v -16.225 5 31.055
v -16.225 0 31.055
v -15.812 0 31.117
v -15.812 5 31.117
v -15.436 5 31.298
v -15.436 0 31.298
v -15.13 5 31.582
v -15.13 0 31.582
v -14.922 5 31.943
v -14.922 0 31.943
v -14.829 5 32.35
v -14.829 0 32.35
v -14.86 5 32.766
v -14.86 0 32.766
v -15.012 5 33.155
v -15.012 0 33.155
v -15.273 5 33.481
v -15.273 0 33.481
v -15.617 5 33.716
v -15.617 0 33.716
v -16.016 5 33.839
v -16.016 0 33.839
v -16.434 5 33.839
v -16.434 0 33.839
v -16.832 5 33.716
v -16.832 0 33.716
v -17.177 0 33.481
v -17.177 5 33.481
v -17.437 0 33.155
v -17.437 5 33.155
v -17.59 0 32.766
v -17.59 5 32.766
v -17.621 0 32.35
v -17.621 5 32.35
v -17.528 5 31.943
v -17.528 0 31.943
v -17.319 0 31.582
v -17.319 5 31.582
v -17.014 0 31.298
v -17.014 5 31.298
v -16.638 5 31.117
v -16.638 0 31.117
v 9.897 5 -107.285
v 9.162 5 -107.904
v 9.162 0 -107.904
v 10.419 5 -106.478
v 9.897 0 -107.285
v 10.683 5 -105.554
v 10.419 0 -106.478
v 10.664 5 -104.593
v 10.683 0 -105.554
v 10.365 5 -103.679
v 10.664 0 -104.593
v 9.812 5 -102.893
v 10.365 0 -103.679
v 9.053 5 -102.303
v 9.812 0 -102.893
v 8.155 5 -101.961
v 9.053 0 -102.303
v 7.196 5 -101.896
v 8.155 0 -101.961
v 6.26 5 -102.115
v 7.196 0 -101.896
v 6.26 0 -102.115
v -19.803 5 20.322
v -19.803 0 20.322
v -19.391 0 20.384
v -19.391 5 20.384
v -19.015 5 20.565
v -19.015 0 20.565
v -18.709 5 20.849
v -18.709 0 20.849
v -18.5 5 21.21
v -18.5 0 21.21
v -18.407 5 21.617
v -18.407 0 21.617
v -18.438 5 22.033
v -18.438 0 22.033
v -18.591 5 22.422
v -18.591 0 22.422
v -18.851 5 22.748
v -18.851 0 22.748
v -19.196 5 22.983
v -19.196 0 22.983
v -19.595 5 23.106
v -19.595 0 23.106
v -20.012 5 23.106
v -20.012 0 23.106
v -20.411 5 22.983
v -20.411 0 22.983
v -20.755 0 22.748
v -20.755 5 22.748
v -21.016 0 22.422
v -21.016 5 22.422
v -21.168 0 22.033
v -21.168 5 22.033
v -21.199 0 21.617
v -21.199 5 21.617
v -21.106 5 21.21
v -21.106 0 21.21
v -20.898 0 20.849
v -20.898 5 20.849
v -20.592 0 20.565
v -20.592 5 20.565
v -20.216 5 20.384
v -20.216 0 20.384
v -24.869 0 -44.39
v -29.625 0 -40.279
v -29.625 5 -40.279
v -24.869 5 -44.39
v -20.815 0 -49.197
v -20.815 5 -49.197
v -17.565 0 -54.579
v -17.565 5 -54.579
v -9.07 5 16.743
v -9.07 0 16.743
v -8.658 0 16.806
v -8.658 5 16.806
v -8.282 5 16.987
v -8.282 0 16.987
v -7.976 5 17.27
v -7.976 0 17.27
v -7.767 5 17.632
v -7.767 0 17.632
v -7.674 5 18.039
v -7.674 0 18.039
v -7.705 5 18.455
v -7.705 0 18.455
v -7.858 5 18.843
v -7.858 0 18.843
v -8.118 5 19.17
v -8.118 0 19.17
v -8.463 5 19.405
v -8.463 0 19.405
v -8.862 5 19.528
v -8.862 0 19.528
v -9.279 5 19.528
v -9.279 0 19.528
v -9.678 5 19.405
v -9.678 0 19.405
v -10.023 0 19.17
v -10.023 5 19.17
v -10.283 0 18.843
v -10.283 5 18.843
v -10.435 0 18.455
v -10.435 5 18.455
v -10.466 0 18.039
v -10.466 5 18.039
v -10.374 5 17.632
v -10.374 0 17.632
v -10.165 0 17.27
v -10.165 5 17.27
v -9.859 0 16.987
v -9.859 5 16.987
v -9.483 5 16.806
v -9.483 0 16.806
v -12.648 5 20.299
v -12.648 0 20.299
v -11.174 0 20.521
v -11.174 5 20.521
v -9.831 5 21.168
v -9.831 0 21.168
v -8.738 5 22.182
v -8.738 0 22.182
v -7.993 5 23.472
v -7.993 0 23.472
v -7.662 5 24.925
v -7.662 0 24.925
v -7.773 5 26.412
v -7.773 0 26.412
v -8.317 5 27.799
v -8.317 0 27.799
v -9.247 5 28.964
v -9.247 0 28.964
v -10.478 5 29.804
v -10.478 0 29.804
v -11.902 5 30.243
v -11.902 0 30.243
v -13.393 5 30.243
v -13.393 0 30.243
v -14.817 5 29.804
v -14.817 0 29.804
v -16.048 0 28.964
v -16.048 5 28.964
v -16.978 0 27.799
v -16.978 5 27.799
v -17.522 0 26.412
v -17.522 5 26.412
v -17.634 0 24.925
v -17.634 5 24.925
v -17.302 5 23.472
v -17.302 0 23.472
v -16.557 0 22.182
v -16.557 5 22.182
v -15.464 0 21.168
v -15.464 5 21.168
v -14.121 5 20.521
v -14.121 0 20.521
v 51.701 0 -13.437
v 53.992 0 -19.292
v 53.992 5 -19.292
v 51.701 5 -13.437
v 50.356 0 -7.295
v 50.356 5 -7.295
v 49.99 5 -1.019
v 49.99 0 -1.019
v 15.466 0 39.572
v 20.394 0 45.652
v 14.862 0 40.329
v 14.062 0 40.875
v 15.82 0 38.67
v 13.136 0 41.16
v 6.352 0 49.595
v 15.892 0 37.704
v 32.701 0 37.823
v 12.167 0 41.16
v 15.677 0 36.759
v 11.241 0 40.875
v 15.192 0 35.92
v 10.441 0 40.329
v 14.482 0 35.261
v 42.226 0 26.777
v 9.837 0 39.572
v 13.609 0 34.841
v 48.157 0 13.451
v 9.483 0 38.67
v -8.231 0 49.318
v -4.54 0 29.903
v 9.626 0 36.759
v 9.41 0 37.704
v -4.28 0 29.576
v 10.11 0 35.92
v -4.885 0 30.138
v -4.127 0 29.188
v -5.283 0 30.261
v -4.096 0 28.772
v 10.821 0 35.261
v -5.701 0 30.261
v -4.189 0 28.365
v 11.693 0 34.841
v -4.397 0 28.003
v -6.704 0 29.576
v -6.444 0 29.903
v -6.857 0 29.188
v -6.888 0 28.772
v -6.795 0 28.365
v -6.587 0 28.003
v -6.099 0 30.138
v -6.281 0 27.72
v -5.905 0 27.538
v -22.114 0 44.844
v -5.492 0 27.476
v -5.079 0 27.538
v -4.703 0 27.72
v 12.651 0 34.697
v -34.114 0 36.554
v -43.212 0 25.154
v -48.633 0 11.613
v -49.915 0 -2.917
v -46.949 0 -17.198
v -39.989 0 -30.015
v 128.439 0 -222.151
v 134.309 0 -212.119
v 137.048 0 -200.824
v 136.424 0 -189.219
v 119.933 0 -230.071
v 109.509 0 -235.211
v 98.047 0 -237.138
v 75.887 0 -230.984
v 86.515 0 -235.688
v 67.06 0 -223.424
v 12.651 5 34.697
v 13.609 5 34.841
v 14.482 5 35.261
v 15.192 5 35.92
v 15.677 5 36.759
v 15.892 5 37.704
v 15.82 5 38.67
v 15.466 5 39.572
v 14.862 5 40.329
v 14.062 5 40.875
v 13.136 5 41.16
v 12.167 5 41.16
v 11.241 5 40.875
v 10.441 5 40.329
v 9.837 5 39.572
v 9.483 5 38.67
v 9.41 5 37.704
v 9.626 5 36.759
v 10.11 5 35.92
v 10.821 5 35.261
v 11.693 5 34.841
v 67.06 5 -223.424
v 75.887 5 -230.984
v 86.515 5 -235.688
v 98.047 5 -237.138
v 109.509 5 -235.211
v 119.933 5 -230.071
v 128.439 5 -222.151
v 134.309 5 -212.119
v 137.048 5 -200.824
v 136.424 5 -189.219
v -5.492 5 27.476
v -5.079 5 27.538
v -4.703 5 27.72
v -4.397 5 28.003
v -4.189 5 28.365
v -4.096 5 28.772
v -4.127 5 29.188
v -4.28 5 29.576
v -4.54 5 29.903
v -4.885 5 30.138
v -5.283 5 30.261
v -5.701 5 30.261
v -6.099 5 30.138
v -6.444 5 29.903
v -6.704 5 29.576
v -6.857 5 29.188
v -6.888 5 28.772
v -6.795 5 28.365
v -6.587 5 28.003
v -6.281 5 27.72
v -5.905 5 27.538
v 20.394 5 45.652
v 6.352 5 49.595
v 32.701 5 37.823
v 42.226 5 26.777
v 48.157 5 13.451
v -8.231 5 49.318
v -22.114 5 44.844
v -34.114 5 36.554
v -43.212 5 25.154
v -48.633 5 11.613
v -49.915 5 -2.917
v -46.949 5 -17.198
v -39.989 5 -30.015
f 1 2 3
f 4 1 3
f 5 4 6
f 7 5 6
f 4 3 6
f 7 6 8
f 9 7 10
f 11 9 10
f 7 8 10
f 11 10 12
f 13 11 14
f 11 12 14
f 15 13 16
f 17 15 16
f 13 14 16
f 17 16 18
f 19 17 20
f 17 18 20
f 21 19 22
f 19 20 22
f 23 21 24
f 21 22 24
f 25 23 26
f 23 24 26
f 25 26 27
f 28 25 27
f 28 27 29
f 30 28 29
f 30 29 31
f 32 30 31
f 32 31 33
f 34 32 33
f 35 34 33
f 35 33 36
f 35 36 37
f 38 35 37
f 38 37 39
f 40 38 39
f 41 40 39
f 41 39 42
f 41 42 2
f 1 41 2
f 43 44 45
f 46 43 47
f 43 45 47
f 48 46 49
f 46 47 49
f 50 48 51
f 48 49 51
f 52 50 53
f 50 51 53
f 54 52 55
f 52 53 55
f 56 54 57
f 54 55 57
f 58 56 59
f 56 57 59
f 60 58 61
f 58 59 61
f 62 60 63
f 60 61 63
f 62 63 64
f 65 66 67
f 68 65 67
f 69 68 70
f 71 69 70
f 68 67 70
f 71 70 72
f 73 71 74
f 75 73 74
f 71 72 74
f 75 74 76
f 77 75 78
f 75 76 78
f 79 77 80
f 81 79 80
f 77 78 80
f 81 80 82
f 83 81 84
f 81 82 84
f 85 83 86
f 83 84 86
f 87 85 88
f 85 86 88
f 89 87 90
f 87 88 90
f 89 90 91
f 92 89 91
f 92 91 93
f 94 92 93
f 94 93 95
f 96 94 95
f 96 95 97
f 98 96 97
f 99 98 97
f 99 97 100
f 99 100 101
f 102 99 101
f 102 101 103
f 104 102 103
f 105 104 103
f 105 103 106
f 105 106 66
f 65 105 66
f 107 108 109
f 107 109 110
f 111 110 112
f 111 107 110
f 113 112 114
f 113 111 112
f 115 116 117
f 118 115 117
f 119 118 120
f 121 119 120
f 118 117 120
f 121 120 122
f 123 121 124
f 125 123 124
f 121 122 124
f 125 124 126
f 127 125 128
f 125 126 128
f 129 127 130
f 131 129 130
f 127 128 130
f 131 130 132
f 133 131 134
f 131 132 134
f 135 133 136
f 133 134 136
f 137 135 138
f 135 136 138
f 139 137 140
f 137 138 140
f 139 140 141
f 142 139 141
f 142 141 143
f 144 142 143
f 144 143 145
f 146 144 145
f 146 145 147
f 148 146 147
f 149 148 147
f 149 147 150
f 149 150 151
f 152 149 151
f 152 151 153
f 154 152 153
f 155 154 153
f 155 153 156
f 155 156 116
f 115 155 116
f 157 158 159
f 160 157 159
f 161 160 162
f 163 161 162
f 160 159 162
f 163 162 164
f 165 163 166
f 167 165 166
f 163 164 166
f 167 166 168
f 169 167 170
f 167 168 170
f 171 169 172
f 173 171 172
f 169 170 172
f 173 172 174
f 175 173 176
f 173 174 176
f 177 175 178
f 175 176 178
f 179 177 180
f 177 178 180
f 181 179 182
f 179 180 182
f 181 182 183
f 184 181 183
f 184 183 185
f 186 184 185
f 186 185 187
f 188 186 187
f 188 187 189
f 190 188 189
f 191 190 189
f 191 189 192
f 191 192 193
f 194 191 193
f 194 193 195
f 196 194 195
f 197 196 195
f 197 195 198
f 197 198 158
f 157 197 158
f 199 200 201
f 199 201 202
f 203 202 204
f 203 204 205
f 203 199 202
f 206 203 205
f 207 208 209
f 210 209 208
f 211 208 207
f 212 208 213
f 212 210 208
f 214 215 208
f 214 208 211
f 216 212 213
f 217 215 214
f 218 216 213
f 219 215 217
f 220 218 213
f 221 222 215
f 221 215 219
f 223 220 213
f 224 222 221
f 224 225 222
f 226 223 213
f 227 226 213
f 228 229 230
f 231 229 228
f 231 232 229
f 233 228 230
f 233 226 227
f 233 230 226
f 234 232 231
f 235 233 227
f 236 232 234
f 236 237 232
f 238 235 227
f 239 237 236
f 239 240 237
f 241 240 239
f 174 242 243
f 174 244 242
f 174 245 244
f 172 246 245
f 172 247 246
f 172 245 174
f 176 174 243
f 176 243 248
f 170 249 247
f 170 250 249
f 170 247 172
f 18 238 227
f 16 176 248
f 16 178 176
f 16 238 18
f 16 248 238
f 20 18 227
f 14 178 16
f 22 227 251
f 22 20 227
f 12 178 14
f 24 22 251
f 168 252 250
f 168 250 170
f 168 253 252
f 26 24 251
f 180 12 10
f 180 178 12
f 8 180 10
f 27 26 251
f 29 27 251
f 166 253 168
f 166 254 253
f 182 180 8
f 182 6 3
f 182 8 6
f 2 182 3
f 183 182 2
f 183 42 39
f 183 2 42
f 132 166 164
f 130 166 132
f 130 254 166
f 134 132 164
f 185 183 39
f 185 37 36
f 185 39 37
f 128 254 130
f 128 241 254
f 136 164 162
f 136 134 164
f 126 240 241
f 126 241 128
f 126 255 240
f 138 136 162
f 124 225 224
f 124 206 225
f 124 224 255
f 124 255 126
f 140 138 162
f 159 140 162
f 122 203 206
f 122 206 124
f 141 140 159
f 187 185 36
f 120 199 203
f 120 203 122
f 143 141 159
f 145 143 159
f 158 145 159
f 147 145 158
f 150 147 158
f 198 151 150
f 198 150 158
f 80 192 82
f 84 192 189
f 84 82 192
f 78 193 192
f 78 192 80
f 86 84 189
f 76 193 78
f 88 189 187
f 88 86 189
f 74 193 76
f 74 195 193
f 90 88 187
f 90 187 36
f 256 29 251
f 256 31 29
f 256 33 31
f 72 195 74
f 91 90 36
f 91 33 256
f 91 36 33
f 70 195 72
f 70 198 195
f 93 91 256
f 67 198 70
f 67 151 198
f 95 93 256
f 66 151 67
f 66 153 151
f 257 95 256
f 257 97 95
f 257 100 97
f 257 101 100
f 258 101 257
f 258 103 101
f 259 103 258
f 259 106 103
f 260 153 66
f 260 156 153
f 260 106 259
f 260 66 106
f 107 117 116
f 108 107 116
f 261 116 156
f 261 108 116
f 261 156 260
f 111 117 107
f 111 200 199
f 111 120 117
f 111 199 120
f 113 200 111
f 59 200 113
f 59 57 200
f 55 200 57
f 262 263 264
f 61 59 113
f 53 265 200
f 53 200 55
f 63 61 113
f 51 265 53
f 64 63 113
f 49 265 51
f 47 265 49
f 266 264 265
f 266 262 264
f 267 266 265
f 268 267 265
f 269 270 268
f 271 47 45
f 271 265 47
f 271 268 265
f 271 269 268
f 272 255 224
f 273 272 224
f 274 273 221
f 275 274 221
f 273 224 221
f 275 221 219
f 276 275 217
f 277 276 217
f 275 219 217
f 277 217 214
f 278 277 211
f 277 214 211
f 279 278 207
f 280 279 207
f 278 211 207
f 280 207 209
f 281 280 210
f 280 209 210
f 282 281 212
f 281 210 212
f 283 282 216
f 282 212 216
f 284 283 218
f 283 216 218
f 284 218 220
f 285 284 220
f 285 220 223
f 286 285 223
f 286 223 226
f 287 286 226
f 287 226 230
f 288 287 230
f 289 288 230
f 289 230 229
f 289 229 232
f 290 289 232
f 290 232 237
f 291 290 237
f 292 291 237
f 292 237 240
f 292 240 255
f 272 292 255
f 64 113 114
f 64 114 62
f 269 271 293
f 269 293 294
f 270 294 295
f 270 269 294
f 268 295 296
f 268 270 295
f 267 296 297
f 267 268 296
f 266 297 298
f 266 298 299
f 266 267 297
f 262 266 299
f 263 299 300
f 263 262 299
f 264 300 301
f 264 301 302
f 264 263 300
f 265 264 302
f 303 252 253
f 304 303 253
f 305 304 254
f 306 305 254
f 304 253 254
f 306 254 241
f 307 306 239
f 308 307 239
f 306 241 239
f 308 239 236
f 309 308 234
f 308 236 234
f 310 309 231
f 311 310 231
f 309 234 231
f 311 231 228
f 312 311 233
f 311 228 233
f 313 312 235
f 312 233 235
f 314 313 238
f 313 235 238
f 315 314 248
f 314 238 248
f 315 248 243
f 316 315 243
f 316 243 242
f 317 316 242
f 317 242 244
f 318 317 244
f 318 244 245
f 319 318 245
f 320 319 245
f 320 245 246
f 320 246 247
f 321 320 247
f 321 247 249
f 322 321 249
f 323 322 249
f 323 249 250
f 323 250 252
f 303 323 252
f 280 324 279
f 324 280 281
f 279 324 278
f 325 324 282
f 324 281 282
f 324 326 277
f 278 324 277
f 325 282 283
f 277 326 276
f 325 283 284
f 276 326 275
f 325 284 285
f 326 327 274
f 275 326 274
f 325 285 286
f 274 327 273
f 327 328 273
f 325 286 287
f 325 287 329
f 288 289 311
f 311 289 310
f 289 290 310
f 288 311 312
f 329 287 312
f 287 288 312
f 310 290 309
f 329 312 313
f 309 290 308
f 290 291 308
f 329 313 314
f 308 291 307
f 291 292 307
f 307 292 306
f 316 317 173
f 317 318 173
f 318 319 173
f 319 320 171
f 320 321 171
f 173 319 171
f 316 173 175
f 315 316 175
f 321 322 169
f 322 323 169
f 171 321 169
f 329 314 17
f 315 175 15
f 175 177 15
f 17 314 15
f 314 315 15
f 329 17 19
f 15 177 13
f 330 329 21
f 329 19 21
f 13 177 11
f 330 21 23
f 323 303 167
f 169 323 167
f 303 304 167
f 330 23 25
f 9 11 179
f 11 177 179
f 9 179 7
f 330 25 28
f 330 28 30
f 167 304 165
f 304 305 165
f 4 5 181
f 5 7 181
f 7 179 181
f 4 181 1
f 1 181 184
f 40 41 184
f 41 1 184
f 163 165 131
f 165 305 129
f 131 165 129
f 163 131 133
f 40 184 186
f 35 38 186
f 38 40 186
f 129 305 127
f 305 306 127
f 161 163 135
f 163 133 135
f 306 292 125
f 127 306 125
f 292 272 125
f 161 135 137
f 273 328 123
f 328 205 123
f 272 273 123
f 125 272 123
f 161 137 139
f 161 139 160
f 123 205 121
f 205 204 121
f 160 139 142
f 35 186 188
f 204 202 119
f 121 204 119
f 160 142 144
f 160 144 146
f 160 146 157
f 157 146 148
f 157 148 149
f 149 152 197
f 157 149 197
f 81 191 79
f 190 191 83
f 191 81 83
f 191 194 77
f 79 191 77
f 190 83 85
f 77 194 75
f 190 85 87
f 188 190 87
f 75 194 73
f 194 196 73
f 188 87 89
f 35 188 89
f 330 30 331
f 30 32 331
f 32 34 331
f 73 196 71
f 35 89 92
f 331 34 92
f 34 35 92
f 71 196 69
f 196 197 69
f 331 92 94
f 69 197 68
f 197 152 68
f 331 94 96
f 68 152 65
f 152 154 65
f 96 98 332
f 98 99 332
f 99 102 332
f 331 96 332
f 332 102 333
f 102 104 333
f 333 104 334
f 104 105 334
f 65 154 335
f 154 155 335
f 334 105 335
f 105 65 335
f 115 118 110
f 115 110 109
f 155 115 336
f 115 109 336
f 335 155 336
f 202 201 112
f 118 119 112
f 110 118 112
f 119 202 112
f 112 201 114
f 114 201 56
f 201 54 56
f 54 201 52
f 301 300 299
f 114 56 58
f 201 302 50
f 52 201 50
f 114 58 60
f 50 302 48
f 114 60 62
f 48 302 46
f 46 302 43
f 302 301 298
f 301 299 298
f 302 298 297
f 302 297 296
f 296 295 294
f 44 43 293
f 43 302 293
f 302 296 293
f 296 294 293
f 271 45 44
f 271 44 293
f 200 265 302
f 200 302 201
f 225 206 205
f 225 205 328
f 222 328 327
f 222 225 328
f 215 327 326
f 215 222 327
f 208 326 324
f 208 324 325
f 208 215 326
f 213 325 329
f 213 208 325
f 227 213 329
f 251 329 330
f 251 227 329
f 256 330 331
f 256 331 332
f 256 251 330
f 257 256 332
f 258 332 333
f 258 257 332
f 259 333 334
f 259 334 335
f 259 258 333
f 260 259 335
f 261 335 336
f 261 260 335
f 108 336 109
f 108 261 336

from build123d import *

# Parameters (mm, degrees)
EXTRUDE_1_DEPTH     = 5
SKETCH_2_R          = 3.25
CUT_EXTRUDE_1_DEPTH = 19
SKETCH_3_R          = 1.4
SKETCH_3_R_2        = 5
CUT_EXTRUDE_3_DEPTH = 16.3


with BuildPart() as part:
    # 草图1 → 凸台-拉伸1 (new body)
    with BuildSketch(Plane(origin=(0, 0, 0), x_dir=(1, 0, 0), z_dir=(0, 1, 0))):
        with BuildLine():
            Line((-17.564991461, 54.578581424), (67.059916818, 223.42374787))
            ThreePointArc((67.059916818, 223.42374787), (114.908570146, 233.021342221), (136.424164559, 189.21852679))
            Line((136.424164559, 189.21852679), (53.992344711, 19.291894357))
            ThreePointArc((53.992344711, 19.291894357), (50.907753569, 10.392547603), (49.989622613, 1.018641763))
            ThreePointArc((49.989622613, 1.018641763), (-22.113685441, -44.844006469), (-29.624956892, 40.278554209))
            ThreePointArc((-29.624956892, 40.278554209), (-22.747275075, 46.713658557), (-17.564991461, 54.578581424))
        make_face()
    extrude(amount=EXTRUDE_1_DEPTH)

    # 草图2 → 切除-拉伸1 (cut)
    with BuildSketch(Plane.XZ):
        with Locations(Location((12.651398898, 37.946569093, 0), (0, 0, 270))):
            Circle(SKETCH_2_R)
        with Locations((81.596428252, -36.190269417)):
            Circle(SKETCH_2_R)
        with Locations((7.459589742, -105.135298771)):
            Circle(SKETCH_2_R)
        with Locations((-61.485439612, -30.998460261)):
            Circle(SKETCH_2_R)
    extrude(amount=-CUT_EXTRUDE_1_DEPTH, mode=Mode.SUBTRACT)

    # 草图3 → 切除-拉伸3 (cut)
    with BuildSketch(Plane.XZ):
        with Locations(Location((-16.224862373, 32.454617251, 0), (0, 0, 270))):
            Circle(SKETCH_3_R)
        with Locations(Location((-19.803218354, 21.72170672, 0), (0, 0, 270))):
            Circle(SKETCH_3_R)
        with Locations(Location((-12.647585098, 25.298983995, 0), (0, 0, 270))):
            Circle(SKETCH_3_R_2)
        with Locations(Location((-5.491951842, 28.876261271, 0), (0, 0, 270))):
            Circle(SKETCH_3_R)
        with Locations(Location((-9.070307822, 18.143350739, 0), (0, 0, 270))):
            Circle(SKETCH_3_R)
    extrude(amount=-CUT_EXTRUDE_3_DEPTH, mode=Mode.SUBTRACT)


solid = part.part
